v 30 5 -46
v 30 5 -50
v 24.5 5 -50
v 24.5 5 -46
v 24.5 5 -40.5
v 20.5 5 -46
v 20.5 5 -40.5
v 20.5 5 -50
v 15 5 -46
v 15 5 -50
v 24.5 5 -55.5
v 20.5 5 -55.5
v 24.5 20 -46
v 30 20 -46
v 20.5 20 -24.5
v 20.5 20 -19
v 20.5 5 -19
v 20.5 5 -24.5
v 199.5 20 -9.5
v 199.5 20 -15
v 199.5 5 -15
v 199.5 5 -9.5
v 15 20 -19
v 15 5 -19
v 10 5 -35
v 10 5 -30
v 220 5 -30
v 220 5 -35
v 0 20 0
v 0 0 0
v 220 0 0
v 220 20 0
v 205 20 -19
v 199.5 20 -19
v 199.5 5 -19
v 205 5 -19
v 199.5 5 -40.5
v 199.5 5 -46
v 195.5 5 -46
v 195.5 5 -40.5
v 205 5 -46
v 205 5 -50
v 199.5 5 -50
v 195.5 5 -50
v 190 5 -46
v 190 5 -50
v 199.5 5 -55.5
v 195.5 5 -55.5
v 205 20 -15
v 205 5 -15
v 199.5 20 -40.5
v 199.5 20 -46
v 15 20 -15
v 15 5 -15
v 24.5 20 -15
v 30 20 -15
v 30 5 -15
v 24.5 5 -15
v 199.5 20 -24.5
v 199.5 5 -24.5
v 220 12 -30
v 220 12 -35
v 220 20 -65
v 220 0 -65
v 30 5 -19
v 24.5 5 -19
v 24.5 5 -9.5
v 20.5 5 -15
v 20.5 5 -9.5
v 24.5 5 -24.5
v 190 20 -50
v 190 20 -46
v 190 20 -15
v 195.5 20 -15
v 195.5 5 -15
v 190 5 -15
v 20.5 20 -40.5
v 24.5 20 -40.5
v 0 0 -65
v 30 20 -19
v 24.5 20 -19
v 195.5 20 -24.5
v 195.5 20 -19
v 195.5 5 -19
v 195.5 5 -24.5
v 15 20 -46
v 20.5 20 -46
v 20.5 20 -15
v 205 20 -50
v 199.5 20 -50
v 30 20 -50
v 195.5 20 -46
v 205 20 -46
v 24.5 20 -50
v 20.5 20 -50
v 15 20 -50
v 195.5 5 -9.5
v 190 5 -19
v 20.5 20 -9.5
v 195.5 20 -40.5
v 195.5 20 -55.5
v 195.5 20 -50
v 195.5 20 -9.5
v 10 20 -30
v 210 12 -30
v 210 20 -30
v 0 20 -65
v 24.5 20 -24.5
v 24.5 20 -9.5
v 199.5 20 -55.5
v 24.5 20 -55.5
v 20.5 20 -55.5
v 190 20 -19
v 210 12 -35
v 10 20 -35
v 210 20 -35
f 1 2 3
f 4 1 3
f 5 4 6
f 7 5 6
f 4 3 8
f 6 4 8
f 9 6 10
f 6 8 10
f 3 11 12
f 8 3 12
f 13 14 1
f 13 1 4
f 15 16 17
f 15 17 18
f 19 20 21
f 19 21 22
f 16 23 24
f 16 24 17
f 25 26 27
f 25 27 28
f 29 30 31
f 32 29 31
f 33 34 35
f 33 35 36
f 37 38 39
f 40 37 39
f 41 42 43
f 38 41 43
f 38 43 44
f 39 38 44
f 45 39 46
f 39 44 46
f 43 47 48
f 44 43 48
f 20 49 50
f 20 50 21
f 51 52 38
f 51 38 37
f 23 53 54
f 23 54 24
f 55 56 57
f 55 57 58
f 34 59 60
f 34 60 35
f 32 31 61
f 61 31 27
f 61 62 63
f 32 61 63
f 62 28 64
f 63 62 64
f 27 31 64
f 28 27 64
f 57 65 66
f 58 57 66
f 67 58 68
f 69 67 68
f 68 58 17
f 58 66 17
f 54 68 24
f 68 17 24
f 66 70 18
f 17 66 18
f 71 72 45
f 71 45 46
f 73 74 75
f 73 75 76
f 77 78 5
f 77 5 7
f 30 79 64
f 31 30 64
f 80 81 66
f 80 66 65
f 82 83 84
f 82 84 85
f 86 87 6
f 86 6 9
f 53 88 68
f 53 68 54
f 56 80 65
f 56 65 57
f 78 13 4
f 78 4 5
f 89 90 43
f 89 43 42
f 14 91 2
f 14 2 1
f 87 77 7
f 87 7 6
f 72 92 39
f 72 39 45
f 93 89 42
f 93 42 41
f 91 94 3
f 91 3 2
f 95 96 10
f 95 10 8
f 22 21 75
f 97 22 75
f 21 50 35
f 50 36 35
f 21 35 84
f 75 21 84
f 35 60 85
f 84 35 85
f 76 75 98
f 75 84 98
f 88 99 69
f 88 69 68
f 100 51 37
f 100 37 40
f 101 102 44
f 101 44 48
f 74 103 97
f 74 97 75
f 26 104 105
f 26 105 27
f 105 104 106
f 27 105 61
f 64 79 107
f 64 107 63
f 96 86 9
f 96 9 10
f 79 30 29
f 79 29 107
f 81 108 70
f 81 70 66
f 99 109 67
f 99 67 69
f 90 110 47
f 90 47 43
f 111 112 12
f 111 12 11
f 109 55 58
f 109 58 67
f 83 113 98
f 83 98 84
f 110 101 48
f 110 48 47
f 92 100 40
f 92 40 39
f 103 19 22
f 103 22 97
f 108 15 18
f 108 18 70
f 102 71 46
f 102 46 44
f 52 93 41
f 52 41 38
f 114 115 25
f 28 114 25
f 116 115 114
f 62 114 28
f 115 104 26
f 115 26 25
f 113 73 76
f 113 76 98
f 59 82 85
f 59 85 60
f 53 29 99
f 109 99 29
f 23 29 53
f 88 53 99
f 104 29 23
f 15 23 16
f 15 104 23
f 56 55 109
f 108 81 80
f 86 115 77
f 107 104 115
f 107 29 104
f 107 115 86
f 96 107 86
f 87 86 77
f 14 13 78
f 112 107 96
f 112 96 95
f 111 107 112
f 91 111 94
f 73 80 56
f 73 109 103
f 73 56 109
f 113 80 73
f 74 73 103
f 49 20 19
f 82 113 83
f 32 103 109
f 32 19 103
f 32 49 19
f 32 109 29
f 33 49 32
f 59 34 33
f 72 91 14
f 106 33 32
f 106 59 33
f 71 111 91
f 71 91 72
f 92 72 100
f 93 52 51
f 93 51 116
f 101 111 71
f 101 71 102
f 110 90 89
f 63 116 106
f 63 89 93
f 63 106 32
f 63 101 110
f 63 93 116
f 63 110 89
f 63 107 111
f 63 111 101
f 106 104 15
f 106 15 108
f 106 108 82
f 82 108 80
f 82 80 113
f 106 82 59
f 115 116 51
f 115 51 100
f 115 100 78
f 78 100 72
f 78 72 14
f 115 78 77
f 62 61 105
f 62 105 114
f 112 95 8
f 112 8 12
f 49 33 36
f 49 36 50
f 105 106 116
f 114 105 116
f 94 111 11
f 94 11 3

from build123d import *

# Parameters (mm, degrees)
SKICA1_W                 = 220
SKICA1_H                 = 65
P_IDAT_VYSUNUT_M1_DEPTH  = 20
SKICA2_W                 = 200
SKICA2_H                 = 5
ODEBRAT_VYSUNUT_M1_DEPTH = 15
SKICA3_W                 = 5
SKICA3_H                 = 7
ODEBRAT_VYSUNUT_M2_DEPTH = 35


with BuildPart() as part:
    # Skica1 → Přidat vysunutím1 (new body)
    with BuildSketch(Plane(origin=(0, 0, 0), x_dir=(1, 0, 0), z_dir=(0, 1, 0))):
        with Locations((110, 32.5)):
            Rectangle(SKICA1_W, SKICA1_H)
    extrude(amount=P_IDAT_VYSUNUT_M1_DEPTH)

    # Skica2 → Odebrat vysunutím1 (cut)
    with BuildSketch(Plane(origin=(0, 20, 0), x_dir=(1, 0, 0), z_dir=(0, 1, 0))):
        with Locations((110, 32.5)):
            Rectangle(SKICA2_W, SKICA2_H)
        Polygon((24.5, 50), (30, 50), (30, 46), (24.5, 46), (24.5, 40.5), (20.5, 40.5), (20.5, 46), (15, 46), (15, 50), (20.5, 50), (20.5, 55.5), (24.5, 55.5), align=None)
        Polygon((15, 15), (15, 19), (20.5, 19), (20.5, 24.5), (24.5, 24.5), (24.5, 19), (30, 19), (30, 15), (24.5, 15), (24.5, 9.5), (20.5, 9.5), (20.5, 15), align=None)
        Polygon((205, 15), (199.5, 15), (199.5, 9.5), (195.5, 9.5), (195.5, 15), (190, 15), (190, 19), (195.5, 19), (195.5, 24.5), (199.5, 24.5), (199.5, 19), (205, 19), align=None)
        Polygon((205, 50), (205, 46), (199.5, 46), (199.5, 40.5), (195.5, 40.5), (195.5, 46), (190, 46), (190, 50), (195.5, 50), (195.5, 55.5), (199.5, 55.5), (199.5, 50), align=None)
    extrude(amount=-ODEBRAT_VYSUNUT_M1_DEPTH, mode=Mode.SUBTRACT)

    # Skica3 → Odebrat vysunutím2 (cut)
    with BuildSketch(Plane(origin=(220, 0, 0), x_dir=(0, 0, -1), z_dir=(1, 0, 0))):
        with Locations((32.5, 8.5)):
            Rectangle(SKICA3_W, SKICA3_H)
    extrude(amount=-ODEBRAT_VYSUNUT_M2_DEPTH, mode=Mode.SUBTRACT)


solid = part.part
